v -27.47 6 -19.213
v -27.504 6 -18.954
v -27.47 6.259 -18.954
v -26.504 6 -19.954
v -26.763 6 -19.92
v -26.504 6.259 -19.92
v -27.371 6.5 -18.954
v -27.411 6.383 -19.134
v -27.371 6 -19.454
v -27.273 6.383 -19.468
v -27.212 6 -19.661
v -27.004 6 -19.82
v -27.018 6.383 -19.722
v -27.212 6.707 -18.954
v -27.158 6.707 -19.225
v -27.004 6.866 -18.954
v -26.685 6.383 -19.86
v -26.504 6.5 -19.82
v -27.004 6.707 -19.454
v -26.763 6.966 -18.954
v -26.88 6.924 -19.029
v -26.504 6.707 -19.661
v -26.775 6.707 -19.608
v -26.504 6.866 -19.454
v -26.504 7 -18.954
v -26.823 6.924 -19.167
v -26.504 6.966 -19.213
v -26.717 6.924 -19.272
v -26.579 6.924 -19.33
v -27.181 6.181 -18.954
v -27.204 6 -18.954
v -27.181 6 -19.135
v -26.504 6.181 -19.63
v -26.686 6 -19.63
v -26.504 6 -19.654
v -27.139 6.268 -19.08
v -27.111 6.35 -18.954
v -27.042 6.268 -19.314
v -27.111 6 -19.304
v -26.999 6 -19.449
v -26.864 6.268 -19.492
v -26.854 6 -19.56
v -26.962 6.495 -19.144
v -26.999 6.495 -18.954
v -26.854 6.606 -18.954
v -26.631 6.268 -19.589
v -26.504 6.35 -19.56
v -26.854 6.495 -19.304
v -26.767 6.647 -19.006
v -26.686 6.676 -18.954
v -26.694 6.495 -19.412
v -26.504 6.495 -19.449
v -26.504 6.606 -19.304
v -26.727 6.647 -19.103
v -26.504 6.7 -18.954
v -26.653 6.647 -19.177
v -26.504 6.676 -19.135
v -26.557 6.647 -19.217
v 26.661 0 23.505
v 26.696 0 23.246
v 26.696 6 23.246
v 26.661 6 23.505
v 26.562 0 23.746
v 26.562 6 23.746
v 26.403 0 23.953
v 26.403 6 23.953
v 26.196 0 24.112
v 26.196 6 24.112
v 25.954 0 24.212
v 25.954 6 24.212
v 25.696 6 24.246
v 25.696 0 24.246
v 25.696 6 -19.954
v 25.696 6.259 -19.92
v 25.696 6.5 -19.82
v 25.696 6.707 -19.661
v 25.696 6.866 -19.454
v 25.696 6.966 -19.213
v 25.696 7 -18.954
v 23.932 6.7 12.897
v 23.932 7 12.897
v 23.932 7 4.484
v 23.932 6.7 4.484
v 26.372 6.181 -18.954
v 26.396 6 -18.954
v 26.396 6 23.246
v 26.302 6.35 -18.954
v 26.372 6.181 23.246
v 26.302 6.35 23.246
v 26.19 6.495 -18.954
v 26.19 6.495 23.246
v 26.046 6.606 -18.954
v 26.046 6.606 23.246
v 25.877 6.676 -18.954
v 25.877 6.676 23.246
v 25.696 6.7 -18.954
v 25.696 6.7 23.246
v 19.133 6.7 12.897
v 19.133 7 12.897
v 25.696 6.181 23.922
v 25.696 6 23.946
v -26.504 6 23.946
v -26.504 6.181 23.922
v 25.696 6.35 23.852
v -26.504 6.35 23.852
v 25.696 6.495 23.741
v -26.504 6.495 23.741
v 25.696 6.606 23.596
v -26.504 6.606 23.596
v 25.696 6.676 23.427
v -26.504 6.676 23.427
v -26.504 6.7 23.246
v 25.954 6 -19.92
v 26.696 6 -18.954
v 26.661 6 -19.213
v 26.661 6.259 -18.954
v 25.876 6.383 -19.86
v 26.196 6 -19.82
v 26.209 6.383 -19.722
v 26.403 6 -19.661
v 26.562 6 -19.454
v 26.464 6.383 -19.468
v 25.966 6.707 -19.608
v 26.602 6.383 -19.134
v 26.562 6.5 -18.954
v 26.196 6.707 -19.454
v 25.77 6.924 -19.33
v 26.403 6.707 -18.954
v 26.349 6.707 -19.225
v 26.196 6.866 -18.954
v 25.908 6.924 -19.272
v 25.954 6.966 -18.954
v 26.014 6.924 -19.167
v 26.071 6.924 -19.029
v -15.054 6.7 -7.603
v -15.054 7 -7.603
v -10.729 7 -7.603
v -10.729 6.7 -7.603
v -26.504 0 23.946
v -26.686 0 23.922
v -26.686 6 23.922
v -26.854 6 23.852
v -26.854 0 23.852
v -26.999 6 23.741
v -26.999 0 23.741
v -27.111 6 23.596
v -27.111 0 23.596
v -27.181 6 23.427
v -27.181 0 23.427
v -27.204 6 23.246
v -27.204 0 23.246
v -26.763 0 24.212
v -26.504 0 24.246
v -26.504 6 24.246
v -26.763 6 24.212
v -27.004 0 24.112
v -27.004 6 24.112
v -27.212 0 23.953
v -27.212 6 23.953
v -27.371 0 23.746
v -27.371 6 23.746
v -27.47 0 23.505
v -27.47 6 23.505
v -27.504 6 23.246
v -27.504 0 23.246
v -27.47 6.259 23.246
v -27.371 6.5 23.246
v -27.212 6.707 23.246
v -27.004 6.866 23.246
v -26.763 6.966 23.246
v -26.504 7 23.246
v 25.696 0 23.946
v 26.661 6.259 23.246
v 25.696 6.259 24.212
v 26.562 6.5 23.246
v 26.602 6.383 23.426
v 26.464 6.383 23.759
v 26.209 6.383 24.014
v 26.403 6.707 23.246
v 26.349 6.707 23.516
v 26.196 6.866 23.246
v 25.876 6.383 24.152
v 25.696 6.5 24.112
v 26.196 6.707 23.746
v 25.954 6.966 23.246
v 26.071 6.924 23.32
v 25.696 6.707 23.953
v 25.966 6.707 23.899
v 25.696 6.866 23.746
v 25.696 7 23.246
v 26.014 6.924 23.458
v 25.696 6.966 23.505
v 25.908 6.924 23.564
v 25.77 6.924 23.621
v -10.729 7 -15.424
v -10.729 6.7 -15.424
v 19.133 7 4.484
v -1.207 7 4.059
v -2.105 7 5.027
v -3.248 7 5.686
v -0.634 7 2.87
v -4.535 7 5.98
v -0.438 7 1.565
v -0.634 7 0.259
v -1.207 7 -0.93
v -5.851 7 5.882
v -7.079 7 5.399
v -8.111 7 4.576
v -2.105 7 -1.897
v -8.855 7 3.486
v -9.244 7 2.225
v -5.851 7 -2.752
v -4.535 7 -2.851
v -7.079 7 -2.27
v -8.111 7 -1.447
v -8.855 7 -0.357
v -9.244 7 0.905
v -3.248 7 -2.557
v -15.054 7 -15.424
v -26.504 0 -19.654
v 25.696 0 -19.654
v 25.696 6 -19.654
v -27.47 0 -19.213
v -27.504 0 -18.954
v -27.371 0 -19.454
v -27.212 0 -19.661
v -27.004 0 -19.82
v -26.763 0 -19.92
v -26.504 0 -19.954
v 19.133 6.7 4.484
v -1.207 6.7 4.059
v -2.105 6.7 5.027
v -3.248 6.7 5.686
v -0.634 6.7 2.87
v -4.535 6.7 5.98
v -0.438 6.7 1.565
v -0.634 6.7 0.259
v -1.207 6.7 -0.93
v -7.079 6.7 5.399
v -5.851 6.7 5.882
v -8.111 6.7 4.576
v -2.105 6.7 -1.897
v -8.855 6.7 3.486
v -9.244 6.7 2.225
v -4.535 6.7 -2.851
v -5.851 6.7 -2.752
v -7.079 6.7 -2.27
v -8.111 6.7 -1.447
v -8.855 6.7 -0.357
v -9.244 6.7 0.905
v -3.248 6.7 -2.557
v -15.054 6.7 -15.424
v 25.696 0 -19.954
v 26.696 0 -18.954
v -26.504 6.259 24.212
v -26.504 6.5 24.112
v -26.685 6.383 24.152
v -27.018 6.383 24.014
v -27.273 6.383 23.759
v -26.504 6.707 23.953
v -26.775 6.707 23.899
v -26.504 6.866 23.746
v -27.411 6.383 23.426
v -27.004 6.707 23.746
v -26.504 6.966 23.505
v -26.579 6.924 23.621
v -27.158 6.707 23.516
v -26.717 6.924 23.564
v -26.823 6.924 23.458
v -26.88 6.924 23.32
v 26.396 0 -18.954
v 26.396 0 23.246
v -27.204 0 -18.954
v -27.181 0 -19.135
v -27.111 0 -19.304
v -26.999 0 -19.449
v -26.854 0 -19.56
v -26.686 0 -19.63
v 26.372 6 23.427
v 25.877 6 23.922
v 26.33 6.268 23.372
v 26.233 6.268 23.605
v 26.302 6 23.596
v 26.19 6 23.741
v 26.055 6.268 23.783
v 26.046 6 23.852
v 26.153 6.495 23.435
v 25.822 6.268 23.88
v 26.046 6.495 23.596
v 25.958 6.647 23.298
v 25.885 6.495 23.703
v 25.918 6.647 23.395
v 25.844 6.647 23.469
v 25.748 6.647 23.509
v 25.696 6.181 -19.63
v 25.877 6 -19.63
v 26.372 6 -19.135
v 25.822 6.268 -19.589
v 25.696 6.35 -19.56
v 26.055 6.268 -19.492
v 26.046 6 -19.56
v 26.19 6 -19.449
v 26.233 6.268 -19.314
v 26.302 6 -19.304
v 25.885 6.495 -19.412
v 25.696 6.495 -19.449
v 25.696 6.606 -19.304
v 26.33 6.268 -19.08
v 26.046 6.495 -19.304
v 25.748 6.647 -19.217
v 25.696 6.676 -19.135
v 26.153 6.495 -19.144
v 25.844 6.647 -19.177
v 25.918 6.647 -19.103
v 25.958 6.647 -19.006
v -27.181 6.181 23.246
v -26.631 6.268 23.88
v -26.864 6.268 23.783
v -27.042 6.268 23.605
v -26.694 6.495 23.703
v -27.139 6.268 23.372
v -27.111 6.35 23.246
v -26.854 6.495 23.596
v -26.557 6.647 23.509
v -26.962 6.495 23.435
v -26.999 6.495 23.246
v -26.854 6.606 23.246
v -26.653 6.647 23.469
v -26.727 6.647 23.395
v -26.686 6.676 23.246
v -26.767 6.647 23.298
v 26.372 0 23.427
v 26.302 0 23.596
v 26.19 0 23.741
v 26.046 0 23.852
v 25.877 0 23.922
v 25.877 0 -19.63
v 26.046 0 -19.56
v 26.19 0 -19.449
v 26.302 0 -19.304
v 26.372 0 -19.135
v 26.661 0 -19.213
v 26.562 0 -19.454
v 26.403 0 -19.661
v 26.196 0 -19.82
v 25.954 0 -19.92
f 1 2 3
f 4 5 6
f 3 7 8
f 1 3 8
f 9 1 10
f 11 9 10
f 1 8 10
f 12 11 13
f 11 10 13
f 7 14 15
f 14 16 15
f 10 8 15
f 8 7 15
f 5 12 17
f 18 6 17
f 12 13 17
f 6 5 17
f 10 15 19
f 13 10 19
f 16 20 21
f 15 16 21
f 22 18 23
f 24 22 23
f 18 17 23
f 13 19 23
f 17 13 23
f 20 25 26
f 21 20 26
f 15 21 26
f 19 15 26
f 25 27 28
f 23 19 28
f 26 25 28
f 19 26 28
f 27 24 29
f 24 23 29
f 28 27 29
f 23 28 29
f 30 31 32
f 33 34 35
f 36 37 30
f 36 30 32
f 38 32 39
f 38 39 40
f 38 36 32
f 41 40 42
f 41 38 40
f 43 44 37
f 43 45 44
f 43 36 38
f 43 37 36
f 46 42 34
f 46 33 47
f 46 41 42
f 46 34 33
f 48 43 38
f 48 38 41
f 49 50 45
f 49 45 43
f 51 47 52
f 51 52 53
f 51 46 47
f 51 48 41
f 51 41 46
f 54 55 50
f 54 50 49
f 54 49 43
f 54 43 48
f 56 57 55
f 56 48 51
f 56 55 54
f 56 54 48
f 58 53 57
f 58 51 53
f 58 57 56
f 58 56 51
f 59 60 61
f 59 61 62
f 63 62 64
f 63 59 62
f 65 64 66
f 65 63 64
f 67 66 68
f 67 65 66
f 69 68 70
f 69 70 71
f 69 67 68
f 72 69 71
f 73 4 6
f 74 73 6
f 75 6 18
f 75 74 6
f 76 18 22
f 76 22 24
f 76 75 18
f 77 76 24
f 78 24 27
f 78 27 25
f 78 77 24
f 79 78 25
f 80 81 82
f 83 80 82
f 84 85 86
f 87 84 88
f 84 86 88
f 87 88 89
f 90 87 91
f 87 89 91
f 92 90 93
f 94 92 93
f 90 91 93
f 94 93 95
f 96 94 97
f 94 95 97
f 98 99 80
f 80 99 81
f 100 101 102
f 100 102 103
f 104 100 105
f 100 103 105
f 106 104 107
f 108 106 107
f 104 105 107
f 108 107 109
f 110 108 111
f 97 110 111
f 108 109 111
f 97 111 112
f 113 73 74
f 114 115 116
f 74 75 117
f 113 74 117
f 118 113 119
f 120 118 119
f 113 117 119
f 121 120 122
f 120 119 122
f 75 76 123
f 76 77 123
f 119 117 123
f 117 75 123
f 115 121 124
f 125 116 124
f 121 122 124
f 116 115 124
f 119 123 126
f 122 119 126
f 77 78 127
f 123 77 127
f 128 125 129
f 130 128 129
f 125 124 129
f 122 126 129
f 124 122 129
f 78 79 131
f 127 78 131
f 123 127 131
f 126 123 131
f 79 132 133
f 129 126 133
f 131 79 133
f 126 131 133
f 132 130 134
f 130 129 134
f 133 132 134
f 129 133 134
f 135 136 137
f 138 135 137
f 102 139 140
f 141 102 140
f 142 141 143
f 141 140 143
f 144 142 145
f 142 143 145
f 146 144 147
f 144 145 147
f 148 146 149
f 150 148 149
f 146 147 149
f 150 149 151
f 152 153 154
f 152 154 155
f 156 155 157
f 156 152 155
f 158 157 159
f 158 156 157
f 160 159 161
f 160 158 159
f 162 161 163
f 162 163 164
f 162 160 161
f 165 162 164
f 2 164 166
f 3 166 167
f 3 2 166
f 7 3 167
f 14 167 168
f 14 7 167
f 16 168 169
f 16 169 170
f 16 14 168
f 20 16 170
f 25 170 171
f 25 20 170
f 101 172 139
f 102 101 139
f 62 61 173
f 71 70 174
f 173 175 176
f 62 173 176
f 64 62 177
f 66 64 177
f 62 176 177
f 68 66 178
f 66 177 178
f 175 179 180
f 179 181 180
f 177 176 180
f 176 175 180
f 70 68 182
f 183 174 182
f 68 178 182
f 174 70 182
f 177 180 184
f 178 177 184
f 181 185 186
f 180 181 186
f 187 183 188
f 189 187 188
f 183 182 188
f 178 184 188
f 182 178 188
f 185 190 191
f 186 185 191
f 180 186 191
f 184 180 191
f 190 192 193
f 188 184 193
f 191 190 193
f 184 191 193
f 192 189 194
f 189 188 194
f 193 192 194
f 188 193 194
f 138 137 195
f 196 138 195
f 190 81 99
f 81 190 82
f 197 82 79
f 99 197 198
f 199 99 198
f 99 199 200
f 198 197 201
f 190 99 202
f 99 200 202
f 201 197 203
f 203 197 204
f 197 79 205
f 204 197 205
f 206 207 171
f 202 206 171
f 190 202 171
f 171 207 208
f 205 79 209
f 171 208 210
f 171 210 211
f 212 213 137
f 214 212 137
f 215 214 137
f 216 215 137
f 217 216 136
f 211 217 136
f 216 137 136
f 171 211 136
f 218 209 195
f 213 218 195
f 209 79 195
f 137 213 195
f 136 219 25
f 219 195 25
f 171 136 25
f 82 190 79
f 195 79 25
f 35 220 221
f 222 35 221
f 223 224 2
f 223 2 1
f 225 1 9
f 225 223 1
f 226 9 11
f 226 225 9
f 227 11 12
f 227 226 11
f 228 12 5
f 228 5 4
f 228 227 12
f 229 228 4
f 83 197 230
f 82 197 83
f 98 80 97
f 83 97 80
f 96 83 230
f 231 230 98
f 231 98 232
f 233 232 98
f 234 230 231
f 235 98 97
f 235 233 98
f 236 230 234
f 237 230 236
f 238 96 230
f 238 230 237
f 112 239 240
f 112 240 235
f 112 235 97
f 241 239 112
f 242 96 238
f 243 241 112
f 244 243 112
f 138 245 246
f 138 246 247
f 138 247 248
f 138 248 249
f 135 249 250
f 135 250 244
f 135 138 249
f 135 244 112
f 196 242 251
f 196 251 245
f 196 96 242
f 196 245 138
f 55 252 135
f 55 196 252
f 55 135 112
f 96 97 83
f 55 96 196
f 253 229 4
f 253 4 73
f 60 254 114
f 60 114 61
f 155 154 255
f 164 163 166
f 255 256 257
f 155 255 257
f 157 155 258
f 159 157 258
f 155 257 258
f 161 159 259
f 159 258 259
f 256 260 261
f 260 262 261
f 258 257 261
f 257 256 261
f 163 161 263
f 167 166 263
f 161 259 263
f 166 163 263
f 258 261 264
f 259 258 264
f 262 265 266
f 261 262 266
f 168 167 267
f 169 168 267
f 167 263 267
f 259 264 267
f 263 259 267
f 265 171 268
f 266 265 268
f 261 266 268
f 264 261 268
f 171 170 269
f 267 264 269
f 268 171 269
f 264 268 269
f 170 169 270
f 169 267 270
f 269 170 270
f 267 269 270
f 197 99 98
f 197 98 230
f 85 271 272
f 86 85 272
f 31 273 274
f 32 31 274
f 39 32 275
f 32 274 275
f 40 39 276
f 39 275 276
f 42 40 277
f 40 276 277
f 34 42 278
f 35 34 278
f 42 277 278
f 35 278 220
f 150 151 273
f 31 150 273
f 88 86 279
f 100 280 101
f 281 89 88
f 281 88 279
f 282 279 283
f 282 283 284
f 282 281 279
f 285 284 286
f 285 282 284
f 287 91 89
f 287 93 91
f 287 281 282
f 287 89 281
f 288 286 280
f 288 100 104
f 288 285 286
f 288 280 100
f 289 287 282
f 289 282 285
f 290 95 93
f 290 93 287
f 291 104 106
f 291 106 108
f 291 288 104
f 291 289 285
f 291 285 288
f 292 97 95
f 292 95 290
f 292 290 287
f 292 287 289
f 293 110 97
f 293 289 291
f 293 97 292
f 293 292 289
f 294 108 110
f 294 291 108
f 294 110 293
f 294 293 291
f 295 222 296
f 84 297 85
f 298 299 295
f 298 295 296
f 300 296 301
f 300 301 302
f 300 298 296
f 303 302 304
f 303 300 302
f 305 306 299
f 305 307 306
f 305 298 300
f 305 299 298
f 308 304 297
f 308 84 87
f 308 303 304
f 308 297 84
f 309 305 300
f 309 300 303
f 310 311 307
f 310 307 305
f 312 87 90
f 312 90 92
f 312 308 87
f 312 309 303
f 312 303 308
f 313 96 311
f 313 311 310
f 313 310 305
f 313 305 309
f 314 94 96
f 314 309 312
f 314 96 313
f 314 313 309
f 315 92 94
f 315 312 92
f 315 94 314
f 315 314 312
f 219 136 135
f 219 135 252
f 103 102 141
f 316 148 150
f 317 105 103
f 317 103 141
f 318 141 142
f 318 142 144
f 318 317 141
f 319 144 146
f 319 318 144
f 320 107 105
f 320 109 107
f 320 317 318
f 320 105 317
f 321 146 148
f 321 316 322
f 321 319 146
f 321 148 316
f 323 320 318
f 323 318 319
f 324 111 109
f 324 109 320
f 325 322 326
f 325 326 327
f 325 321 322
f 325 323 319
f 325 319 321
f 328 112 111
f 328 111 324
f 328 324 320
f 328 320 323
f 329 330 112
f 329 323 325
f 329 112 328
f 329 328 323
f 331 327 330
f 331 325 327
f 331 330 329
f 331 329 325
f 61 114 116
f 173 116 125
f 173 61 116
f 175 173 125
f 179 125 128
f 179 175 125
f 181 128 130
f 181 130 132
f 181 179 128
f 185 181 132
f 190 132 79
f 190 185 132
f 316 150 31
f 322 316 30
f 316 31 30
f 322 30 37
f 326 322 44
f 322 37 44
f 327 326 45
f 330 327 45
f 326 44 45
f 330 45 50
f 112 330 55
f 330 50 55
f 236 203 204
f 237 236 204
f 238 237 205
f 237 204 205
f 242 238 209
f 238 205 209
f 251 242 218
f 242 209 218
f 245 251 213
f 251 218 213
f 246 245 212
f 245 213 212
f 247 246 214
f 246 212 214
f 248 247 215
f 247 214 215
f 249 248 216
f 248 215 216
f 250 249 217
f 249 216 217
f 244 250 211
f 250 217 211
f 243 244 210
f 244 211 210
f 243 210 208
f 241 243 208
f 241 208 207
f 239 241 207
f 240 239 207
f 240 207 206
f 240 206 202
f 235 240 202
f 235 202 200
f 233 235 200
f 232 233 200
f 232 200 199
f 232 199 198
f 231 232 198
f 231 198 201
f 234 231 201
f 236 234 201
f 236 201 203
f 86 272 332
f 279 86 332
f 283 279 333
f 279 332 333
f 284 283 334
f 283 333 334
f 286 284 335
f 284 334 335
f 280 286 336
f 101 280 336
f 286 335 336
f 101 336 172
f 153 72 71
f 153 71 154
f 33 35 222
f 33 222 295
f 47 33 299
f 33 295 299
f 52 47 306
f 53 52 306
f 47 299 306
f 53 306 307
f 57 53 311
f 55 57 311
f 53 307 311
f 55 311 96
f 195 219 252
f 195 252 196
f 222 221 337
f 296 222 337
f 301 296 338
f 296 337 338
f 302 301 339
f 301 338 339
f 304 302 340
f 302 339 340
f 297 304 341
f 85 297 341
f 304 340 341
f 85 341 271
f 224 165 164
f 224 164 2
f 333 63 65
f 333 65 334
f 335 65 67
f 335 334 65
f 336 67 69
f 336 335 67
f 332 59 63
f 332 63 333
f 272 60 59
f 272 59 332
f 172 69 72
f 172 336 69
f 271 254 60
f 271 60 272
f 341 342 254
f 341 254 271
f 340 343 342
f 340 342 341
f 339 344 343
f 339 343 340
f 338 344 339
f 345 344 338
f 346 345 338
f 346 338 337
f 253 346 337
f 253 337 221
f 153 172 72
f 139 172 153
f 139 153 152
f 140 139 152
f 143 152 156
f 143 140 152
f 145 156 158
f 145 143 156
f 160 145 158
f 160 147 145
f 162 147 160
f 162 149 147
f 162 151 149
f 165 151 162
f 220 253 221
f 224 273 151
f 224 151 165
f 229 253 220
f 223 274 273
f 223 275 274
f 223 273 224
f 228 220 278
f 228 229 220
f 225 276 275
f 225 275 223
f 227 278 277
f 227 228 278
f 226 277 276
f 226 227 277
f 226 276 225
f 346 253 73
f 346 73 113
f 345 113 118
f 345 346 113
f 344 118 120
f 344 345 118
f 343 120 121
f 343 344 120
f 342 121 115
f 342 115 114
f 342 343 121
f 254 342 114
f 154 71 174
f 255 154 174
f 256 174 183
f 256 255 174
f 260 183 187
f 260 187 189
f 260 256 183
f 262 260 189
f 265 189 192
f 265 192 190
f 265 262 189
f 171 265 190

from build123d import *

# Parameters (mm, degrees)
BOSS_EXTRU_1_DEPTH      = 7
CONG_1_R                = 1
COQUE1_T                = -0.3
ENL_V_MAT_EXTRU_1_REACH = 9
ESQUISSE8_R             = 4.427961532
ENL_V_MAT_EXTRU_2_REACH = 9
ESQUISSE9_W             = 4.325203416
ESQUISSE9_H             = 7.820915767
ENL_V_MAT_EXTRU_3_REACH = 9
ESQUISSE10_W            = 4.799198311
ESQUISSE10_H            = 8.413409385


with BuildPart() as part:
    # Esquisse3 → Boss.-Extru.1 (new body)
    with BuildSketch(Plane(origin=(0, 0, 0), x_dir=(1, 0, 0), z_dir=(0, 1, 0))):
        with BuildLine():
            Line((-26.504477612, 19.954228856), (25.695522388, 19.954228856))
            ThreePointArc((25.695522388, 19.954228856), (26.402629169, 19.661335637), (26.695522388, 18.954228856))
            Line((26.695522388, 18.954228856), (26.695522388, -23.245771144))
            ThreePointArc((26.695522388, -23.245771144), (26.402629169, -23.952877925), (25.695522388, -24.245771144))
            Line((25.695522388, -24.245771144), (-26.504477612, -24.245771144))
            ThreePointArc((-26.504477612, -24.245771144), (-27.211584393, -23.952877925), (-27.504477612, -23.245771144))
            Line((-27.504477612, -23.245771144), (-27.504477612, 18.954228856))
            ThreePointArc((-27.504477612, 18.954228856), (-27.211584393, 19.661335637), (-26.504477612, 19.954228856))
        make_face()
    extrude(amount=BOSS_EXTRU_1_DEPTH)

    # Congé1
    cong_1_edges = [part.edges().sort_by_distance(p)[0] for p in [
        (26.402629169, 7, -19.661335637),
        (26.695522388, 7, 2.145771144),
        (26.402629169, 7, 23.952877925),
        (-0.404477612, 7, 24.245771144),
        (-27.211584393, 7, 23.952877925),
        (-27.504477612, 7, 2.145771144),
        (-27.211584393, 7, -19.661335637),
        (-0.404477612, 7, -19.954228856),
    ]]
    fillet(cong_1_edges, radius=CONG_1_R)

    # Coque1
    coque1_openings = [part.faces().sort_by_distance(p)[0] for p in [
        (-0.404477612, 0, 2.145771144),
    ]]
    offset(amount=COQUE1_T, openings=coque1_openings, kind=Kind.INTERSECTION)

    # Esquisse8 → Enlèv. mat.-Extru.1 (cut, up to next)
    with BuildSketch(Plane(origin=(0, 7, 0), x_dir=(1, 0, 0), z_dir=(0, 1, 0)), mode=Mode.PRIVATE) as enl_v_mat_extru_1_sk1:
        with Locations((-4.865513773, -1.564595223)):
            Circle(ESQUISSE8_R)
    enl_v_mat_extru_1_tool1 = extrude(enl_v_mat_extru_1_sk1.sketch, amount=-ENL_V_MAT_EXTRU_1_REACH, mode=Mode.PRIVATE) & part.part
    add(enl_v_mat_extru_1_tool1.solids().sort_by_distance((-4.865514, 7, 1.564595))[0], mode=Mode.SUBTRACT)

    # Esquisse9 → Enlèv. mat.-Extru.2 (cut, up to next)
    with BuildSketch(Plane(origin=(0, 7, 0), x_dir=(1, 0, 0), z_dir=(0, 1, 0)), mode=Mode.PRIVATE) as enl_v_mat_extru_2_sk1:
        with Locations((-12.89117049, 11.513635006)):
            Rectangle(ESQUISSE9_W, ESQUISSE9_H)
    enl_v_mat_extru_2_tool1 = extrude(enl_v_mat_extru_2_sk1.sketch, amount=-ENL_V_MAT_EXTRU_2_REACH, mode=Mode.PRIVATE) & part.part
    add(enl_v_mat_extru_2_tool1.solids().sort_by_distance((-12.89117, 7, -11.513635))[0], mode=Mode.SUBTRACT)

    # Esquisse10 → Enlèv. mat.-Extru.3 (cut, up to next)
    with BuildSketch(Plane(origin=(0, 7, 0), x_dir=(1, 0, 0), z_dir=(0, 1, 0)), mode=Mode.PRIVATE) as enl_v_mat_extru_3_sk1:
        with Locations((21.532708754, -8.690397391)):
            Rectangle(ESQUISSE10_W, ESQUISSE10_H)
    enl_v_mat_extru_3_tool1 = extrude(enl_v_mat_extru_3_sk1.sketch, amount=-ENL_V_MAT_EXTRU_3_REACH, mode=Mode.PRIVATE) & part.part
    add(enl_v_mat_extru_3_tool1.solids().sort_by_distance((21.532709, 7, 8.690397))[0], mode=Mode.SUBTRACT)


solid = part.part
